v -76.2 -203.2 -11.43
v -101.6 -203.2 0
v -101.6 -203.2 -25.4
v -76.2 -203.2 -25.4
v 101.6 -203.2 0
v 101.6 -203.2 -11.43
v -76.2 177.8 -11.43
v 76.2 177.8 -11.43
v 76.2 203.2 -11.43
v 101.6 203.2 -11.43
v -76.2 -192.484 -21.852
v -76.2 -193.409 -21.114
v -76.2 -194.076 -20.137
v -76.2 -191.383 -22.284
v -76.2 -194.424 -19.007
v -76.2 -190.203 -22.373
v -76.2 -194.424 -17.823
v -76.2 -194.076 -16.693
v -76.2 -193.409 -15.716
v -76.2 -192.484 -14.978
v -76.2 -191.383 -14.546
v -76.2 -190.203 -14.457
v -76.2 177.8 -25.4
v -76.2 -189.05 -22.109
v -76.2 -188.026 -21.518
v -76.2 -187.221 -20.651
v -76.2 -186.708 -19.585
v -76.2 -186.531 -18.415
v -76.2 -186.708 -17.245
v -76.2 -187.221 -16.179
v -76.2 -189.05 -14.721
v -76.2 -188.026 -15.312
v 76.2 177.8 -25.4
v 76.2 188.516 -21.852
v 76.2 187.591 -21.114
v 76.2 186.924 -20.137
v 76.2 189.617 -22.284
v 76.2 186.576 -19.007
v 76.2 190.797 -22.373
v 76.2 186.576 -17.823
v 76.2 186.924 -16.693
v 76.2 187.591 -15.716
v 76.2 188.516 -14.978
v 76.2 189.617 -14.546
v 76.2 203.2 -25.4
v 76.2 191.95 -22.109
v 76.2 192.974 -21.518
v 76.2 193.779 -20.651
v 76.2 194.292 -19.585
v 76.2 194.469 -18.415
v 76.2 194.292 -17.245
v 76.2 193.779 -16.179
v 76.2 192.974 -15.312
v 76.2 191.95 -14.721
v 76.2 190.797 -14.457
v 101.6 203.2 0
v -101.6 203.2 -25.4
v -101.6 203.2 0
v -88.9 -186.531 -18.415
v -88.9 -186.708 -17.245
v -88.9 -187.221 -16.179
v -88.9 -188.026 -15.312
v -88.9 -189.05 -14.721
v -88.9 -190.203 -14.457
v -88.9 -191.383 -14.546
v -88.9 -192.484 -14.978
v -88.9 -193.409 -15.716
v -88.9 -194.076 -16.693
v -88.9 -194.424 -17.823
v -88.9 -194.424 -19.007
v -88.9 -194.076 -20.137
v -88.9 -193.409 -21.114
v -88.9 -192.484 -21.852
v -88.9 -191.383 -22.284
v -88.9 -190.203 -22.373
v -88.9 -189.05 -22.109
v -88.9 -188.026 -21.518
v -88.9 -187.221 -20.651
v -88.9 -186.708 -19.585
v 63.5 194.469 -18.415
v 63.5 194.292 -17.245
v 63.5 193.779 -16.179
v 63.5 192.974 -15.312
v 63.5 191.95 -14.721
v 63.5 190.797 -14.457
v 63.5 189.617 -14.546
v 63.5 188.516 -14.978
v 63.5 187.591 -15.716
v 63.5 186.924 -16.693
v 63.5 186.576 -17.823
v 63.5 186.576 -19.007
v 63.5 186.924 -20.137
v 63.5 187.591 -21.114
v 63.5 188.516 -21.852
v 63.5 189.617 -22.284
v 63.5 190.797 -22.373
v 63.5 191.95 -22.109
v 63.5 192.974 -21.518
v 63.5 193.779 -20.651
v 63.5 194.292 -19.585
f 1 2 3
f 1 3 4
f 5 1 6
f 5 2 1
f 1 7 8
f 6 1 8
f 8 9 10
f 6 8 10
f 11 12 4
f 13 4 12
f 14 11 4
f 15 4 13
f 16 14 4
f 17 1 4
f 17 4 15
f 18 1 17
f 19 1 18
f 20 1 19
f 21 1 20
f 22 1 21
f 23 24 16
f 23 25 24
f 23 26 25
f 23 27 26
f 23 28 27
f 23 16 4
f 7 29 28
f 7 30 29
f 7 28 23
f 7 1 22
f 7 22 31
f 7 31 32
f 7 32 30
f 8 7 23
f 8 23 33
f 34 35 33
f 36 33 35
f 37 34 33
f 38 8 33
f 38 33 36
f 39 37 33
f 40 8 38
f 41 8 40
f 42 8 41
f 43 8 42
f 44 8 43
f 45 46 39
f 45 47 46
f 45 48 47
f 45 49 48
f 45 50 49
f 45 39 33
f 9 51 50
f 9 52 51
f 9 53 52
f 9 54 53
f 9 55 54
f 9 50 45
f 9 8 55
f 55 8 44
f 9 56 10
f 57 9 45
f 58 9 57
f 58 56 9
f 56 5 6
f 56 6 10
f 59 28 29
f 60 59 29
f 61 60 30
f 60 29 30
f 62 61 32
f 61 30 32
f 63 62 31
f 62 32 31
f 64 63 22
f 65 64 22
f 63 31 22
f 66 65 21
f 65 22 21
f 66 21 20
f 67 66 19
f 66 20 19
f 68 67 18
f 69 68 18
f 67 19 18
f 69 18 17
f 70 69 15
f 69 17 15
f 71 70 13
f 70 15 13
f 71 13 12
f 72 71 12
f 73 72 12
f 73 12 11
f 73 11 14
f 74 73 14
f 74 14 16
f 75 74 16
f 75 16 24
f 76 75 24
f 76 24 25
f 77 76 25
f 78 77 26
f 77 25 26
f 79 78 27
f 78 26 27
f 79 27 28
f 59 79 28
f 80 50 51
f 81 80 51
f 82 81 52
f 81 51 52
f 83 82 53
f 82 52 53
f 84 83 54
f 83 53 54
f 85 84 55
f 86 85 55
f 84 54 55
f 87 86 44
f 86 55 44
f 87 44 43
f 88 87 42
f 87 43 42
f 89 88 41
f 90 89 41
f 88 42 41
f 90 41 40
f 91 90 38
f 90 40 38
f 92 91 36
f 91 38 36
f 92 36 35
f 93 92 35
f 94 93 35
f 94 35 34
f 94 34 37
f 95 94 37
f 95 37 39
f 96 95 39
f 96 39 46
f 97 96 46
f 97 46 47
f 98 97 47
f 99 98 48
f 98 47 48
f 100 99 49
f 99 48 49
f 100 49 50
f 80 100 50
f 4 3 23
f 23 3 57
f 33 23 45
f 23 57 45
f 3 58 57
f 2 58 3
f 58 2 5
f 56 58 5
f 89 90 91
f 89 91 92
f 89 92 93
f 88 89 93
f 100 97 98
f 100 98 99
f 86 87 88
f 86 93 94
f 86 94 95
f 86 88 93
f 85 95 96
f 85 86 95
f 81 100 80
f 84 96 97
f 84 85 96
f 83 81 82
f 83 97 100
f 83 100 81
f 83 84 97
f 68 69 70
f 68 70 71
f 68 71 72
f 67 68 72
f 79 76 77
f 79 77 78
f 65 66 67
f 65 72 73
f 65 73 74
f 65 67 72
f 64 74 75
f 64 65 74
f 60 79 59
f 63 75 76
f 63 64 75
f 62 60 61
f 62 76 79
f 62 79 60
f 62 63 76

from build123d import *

# Parameters (mm, degrees)
F0_W     = 25.4
F0_H     = 25.4
F0_H_2   = 381
F0_W_2   = 152.4
F1_DEPTH = 25.4
F2_DEPTH = 11.43
F4_R     = 3.96875
F5_DEPTH = 12.7
F3_R     = 3.96875
F6_DEPTH = 12.7


with BuildPart() as f1:
    # F0 (on Top) → F1 (new body)
    with BuildSketch(Plane.XY):
        with Locations((-88.9, 190.5)):
            Rectangle(F0_W, F0_H)
        with Locations((-88.9, -12.7)):
            Rectangle(F0_W, F0_H_2)
        with Locations((0, 190.5)):
            Rectangle(F0_W_2, F0_H)
    extrude(amount=-F1_DEPTH)

    # F0 (on Top) → F2 (join)
    with BuildSketch(Plane.XY):
        with Locations((-88.9, 190.5)):
            Rectangle(F0_W, F0_H)
        with Locations((-88.9, -12.7)):
            Rectangle(F0_W, F0_H_2)
        with Locations((0, 190.5)):
            Rectangle(F0_W_2, F0_H)
        Polygon((101.6, -203.2), (101.6, 177.8), (76.2, 177.8), (-76.2, 177.8), (-76.2, -203.2), align=None)
        with Locations((88.9, 190.5)):
            Rectangle(F0_W, F0_H)
    extrude(amount=-F2_DEPTH)

    # F4 (on face) → F5 (cut)
    with BuildSketch(Plane.YZ.offset(76.2)):
        with Locations((190.5, -18.415)):
            Circle(F4_R)
    extrude(amount=-F5_DEPTH, mode=Mode.SUBTRACT)

    # F3 (on face) → F6 (cut)
    with BuildSketch(Plane.YZ.offset(-76.2)):
        with Locations((-190.5, -18.415)):
            Circle(F3_R)
    extrude(amount=-F6_DEPTH, mode=Mode.SUBTRACT)


solid = f1.part
